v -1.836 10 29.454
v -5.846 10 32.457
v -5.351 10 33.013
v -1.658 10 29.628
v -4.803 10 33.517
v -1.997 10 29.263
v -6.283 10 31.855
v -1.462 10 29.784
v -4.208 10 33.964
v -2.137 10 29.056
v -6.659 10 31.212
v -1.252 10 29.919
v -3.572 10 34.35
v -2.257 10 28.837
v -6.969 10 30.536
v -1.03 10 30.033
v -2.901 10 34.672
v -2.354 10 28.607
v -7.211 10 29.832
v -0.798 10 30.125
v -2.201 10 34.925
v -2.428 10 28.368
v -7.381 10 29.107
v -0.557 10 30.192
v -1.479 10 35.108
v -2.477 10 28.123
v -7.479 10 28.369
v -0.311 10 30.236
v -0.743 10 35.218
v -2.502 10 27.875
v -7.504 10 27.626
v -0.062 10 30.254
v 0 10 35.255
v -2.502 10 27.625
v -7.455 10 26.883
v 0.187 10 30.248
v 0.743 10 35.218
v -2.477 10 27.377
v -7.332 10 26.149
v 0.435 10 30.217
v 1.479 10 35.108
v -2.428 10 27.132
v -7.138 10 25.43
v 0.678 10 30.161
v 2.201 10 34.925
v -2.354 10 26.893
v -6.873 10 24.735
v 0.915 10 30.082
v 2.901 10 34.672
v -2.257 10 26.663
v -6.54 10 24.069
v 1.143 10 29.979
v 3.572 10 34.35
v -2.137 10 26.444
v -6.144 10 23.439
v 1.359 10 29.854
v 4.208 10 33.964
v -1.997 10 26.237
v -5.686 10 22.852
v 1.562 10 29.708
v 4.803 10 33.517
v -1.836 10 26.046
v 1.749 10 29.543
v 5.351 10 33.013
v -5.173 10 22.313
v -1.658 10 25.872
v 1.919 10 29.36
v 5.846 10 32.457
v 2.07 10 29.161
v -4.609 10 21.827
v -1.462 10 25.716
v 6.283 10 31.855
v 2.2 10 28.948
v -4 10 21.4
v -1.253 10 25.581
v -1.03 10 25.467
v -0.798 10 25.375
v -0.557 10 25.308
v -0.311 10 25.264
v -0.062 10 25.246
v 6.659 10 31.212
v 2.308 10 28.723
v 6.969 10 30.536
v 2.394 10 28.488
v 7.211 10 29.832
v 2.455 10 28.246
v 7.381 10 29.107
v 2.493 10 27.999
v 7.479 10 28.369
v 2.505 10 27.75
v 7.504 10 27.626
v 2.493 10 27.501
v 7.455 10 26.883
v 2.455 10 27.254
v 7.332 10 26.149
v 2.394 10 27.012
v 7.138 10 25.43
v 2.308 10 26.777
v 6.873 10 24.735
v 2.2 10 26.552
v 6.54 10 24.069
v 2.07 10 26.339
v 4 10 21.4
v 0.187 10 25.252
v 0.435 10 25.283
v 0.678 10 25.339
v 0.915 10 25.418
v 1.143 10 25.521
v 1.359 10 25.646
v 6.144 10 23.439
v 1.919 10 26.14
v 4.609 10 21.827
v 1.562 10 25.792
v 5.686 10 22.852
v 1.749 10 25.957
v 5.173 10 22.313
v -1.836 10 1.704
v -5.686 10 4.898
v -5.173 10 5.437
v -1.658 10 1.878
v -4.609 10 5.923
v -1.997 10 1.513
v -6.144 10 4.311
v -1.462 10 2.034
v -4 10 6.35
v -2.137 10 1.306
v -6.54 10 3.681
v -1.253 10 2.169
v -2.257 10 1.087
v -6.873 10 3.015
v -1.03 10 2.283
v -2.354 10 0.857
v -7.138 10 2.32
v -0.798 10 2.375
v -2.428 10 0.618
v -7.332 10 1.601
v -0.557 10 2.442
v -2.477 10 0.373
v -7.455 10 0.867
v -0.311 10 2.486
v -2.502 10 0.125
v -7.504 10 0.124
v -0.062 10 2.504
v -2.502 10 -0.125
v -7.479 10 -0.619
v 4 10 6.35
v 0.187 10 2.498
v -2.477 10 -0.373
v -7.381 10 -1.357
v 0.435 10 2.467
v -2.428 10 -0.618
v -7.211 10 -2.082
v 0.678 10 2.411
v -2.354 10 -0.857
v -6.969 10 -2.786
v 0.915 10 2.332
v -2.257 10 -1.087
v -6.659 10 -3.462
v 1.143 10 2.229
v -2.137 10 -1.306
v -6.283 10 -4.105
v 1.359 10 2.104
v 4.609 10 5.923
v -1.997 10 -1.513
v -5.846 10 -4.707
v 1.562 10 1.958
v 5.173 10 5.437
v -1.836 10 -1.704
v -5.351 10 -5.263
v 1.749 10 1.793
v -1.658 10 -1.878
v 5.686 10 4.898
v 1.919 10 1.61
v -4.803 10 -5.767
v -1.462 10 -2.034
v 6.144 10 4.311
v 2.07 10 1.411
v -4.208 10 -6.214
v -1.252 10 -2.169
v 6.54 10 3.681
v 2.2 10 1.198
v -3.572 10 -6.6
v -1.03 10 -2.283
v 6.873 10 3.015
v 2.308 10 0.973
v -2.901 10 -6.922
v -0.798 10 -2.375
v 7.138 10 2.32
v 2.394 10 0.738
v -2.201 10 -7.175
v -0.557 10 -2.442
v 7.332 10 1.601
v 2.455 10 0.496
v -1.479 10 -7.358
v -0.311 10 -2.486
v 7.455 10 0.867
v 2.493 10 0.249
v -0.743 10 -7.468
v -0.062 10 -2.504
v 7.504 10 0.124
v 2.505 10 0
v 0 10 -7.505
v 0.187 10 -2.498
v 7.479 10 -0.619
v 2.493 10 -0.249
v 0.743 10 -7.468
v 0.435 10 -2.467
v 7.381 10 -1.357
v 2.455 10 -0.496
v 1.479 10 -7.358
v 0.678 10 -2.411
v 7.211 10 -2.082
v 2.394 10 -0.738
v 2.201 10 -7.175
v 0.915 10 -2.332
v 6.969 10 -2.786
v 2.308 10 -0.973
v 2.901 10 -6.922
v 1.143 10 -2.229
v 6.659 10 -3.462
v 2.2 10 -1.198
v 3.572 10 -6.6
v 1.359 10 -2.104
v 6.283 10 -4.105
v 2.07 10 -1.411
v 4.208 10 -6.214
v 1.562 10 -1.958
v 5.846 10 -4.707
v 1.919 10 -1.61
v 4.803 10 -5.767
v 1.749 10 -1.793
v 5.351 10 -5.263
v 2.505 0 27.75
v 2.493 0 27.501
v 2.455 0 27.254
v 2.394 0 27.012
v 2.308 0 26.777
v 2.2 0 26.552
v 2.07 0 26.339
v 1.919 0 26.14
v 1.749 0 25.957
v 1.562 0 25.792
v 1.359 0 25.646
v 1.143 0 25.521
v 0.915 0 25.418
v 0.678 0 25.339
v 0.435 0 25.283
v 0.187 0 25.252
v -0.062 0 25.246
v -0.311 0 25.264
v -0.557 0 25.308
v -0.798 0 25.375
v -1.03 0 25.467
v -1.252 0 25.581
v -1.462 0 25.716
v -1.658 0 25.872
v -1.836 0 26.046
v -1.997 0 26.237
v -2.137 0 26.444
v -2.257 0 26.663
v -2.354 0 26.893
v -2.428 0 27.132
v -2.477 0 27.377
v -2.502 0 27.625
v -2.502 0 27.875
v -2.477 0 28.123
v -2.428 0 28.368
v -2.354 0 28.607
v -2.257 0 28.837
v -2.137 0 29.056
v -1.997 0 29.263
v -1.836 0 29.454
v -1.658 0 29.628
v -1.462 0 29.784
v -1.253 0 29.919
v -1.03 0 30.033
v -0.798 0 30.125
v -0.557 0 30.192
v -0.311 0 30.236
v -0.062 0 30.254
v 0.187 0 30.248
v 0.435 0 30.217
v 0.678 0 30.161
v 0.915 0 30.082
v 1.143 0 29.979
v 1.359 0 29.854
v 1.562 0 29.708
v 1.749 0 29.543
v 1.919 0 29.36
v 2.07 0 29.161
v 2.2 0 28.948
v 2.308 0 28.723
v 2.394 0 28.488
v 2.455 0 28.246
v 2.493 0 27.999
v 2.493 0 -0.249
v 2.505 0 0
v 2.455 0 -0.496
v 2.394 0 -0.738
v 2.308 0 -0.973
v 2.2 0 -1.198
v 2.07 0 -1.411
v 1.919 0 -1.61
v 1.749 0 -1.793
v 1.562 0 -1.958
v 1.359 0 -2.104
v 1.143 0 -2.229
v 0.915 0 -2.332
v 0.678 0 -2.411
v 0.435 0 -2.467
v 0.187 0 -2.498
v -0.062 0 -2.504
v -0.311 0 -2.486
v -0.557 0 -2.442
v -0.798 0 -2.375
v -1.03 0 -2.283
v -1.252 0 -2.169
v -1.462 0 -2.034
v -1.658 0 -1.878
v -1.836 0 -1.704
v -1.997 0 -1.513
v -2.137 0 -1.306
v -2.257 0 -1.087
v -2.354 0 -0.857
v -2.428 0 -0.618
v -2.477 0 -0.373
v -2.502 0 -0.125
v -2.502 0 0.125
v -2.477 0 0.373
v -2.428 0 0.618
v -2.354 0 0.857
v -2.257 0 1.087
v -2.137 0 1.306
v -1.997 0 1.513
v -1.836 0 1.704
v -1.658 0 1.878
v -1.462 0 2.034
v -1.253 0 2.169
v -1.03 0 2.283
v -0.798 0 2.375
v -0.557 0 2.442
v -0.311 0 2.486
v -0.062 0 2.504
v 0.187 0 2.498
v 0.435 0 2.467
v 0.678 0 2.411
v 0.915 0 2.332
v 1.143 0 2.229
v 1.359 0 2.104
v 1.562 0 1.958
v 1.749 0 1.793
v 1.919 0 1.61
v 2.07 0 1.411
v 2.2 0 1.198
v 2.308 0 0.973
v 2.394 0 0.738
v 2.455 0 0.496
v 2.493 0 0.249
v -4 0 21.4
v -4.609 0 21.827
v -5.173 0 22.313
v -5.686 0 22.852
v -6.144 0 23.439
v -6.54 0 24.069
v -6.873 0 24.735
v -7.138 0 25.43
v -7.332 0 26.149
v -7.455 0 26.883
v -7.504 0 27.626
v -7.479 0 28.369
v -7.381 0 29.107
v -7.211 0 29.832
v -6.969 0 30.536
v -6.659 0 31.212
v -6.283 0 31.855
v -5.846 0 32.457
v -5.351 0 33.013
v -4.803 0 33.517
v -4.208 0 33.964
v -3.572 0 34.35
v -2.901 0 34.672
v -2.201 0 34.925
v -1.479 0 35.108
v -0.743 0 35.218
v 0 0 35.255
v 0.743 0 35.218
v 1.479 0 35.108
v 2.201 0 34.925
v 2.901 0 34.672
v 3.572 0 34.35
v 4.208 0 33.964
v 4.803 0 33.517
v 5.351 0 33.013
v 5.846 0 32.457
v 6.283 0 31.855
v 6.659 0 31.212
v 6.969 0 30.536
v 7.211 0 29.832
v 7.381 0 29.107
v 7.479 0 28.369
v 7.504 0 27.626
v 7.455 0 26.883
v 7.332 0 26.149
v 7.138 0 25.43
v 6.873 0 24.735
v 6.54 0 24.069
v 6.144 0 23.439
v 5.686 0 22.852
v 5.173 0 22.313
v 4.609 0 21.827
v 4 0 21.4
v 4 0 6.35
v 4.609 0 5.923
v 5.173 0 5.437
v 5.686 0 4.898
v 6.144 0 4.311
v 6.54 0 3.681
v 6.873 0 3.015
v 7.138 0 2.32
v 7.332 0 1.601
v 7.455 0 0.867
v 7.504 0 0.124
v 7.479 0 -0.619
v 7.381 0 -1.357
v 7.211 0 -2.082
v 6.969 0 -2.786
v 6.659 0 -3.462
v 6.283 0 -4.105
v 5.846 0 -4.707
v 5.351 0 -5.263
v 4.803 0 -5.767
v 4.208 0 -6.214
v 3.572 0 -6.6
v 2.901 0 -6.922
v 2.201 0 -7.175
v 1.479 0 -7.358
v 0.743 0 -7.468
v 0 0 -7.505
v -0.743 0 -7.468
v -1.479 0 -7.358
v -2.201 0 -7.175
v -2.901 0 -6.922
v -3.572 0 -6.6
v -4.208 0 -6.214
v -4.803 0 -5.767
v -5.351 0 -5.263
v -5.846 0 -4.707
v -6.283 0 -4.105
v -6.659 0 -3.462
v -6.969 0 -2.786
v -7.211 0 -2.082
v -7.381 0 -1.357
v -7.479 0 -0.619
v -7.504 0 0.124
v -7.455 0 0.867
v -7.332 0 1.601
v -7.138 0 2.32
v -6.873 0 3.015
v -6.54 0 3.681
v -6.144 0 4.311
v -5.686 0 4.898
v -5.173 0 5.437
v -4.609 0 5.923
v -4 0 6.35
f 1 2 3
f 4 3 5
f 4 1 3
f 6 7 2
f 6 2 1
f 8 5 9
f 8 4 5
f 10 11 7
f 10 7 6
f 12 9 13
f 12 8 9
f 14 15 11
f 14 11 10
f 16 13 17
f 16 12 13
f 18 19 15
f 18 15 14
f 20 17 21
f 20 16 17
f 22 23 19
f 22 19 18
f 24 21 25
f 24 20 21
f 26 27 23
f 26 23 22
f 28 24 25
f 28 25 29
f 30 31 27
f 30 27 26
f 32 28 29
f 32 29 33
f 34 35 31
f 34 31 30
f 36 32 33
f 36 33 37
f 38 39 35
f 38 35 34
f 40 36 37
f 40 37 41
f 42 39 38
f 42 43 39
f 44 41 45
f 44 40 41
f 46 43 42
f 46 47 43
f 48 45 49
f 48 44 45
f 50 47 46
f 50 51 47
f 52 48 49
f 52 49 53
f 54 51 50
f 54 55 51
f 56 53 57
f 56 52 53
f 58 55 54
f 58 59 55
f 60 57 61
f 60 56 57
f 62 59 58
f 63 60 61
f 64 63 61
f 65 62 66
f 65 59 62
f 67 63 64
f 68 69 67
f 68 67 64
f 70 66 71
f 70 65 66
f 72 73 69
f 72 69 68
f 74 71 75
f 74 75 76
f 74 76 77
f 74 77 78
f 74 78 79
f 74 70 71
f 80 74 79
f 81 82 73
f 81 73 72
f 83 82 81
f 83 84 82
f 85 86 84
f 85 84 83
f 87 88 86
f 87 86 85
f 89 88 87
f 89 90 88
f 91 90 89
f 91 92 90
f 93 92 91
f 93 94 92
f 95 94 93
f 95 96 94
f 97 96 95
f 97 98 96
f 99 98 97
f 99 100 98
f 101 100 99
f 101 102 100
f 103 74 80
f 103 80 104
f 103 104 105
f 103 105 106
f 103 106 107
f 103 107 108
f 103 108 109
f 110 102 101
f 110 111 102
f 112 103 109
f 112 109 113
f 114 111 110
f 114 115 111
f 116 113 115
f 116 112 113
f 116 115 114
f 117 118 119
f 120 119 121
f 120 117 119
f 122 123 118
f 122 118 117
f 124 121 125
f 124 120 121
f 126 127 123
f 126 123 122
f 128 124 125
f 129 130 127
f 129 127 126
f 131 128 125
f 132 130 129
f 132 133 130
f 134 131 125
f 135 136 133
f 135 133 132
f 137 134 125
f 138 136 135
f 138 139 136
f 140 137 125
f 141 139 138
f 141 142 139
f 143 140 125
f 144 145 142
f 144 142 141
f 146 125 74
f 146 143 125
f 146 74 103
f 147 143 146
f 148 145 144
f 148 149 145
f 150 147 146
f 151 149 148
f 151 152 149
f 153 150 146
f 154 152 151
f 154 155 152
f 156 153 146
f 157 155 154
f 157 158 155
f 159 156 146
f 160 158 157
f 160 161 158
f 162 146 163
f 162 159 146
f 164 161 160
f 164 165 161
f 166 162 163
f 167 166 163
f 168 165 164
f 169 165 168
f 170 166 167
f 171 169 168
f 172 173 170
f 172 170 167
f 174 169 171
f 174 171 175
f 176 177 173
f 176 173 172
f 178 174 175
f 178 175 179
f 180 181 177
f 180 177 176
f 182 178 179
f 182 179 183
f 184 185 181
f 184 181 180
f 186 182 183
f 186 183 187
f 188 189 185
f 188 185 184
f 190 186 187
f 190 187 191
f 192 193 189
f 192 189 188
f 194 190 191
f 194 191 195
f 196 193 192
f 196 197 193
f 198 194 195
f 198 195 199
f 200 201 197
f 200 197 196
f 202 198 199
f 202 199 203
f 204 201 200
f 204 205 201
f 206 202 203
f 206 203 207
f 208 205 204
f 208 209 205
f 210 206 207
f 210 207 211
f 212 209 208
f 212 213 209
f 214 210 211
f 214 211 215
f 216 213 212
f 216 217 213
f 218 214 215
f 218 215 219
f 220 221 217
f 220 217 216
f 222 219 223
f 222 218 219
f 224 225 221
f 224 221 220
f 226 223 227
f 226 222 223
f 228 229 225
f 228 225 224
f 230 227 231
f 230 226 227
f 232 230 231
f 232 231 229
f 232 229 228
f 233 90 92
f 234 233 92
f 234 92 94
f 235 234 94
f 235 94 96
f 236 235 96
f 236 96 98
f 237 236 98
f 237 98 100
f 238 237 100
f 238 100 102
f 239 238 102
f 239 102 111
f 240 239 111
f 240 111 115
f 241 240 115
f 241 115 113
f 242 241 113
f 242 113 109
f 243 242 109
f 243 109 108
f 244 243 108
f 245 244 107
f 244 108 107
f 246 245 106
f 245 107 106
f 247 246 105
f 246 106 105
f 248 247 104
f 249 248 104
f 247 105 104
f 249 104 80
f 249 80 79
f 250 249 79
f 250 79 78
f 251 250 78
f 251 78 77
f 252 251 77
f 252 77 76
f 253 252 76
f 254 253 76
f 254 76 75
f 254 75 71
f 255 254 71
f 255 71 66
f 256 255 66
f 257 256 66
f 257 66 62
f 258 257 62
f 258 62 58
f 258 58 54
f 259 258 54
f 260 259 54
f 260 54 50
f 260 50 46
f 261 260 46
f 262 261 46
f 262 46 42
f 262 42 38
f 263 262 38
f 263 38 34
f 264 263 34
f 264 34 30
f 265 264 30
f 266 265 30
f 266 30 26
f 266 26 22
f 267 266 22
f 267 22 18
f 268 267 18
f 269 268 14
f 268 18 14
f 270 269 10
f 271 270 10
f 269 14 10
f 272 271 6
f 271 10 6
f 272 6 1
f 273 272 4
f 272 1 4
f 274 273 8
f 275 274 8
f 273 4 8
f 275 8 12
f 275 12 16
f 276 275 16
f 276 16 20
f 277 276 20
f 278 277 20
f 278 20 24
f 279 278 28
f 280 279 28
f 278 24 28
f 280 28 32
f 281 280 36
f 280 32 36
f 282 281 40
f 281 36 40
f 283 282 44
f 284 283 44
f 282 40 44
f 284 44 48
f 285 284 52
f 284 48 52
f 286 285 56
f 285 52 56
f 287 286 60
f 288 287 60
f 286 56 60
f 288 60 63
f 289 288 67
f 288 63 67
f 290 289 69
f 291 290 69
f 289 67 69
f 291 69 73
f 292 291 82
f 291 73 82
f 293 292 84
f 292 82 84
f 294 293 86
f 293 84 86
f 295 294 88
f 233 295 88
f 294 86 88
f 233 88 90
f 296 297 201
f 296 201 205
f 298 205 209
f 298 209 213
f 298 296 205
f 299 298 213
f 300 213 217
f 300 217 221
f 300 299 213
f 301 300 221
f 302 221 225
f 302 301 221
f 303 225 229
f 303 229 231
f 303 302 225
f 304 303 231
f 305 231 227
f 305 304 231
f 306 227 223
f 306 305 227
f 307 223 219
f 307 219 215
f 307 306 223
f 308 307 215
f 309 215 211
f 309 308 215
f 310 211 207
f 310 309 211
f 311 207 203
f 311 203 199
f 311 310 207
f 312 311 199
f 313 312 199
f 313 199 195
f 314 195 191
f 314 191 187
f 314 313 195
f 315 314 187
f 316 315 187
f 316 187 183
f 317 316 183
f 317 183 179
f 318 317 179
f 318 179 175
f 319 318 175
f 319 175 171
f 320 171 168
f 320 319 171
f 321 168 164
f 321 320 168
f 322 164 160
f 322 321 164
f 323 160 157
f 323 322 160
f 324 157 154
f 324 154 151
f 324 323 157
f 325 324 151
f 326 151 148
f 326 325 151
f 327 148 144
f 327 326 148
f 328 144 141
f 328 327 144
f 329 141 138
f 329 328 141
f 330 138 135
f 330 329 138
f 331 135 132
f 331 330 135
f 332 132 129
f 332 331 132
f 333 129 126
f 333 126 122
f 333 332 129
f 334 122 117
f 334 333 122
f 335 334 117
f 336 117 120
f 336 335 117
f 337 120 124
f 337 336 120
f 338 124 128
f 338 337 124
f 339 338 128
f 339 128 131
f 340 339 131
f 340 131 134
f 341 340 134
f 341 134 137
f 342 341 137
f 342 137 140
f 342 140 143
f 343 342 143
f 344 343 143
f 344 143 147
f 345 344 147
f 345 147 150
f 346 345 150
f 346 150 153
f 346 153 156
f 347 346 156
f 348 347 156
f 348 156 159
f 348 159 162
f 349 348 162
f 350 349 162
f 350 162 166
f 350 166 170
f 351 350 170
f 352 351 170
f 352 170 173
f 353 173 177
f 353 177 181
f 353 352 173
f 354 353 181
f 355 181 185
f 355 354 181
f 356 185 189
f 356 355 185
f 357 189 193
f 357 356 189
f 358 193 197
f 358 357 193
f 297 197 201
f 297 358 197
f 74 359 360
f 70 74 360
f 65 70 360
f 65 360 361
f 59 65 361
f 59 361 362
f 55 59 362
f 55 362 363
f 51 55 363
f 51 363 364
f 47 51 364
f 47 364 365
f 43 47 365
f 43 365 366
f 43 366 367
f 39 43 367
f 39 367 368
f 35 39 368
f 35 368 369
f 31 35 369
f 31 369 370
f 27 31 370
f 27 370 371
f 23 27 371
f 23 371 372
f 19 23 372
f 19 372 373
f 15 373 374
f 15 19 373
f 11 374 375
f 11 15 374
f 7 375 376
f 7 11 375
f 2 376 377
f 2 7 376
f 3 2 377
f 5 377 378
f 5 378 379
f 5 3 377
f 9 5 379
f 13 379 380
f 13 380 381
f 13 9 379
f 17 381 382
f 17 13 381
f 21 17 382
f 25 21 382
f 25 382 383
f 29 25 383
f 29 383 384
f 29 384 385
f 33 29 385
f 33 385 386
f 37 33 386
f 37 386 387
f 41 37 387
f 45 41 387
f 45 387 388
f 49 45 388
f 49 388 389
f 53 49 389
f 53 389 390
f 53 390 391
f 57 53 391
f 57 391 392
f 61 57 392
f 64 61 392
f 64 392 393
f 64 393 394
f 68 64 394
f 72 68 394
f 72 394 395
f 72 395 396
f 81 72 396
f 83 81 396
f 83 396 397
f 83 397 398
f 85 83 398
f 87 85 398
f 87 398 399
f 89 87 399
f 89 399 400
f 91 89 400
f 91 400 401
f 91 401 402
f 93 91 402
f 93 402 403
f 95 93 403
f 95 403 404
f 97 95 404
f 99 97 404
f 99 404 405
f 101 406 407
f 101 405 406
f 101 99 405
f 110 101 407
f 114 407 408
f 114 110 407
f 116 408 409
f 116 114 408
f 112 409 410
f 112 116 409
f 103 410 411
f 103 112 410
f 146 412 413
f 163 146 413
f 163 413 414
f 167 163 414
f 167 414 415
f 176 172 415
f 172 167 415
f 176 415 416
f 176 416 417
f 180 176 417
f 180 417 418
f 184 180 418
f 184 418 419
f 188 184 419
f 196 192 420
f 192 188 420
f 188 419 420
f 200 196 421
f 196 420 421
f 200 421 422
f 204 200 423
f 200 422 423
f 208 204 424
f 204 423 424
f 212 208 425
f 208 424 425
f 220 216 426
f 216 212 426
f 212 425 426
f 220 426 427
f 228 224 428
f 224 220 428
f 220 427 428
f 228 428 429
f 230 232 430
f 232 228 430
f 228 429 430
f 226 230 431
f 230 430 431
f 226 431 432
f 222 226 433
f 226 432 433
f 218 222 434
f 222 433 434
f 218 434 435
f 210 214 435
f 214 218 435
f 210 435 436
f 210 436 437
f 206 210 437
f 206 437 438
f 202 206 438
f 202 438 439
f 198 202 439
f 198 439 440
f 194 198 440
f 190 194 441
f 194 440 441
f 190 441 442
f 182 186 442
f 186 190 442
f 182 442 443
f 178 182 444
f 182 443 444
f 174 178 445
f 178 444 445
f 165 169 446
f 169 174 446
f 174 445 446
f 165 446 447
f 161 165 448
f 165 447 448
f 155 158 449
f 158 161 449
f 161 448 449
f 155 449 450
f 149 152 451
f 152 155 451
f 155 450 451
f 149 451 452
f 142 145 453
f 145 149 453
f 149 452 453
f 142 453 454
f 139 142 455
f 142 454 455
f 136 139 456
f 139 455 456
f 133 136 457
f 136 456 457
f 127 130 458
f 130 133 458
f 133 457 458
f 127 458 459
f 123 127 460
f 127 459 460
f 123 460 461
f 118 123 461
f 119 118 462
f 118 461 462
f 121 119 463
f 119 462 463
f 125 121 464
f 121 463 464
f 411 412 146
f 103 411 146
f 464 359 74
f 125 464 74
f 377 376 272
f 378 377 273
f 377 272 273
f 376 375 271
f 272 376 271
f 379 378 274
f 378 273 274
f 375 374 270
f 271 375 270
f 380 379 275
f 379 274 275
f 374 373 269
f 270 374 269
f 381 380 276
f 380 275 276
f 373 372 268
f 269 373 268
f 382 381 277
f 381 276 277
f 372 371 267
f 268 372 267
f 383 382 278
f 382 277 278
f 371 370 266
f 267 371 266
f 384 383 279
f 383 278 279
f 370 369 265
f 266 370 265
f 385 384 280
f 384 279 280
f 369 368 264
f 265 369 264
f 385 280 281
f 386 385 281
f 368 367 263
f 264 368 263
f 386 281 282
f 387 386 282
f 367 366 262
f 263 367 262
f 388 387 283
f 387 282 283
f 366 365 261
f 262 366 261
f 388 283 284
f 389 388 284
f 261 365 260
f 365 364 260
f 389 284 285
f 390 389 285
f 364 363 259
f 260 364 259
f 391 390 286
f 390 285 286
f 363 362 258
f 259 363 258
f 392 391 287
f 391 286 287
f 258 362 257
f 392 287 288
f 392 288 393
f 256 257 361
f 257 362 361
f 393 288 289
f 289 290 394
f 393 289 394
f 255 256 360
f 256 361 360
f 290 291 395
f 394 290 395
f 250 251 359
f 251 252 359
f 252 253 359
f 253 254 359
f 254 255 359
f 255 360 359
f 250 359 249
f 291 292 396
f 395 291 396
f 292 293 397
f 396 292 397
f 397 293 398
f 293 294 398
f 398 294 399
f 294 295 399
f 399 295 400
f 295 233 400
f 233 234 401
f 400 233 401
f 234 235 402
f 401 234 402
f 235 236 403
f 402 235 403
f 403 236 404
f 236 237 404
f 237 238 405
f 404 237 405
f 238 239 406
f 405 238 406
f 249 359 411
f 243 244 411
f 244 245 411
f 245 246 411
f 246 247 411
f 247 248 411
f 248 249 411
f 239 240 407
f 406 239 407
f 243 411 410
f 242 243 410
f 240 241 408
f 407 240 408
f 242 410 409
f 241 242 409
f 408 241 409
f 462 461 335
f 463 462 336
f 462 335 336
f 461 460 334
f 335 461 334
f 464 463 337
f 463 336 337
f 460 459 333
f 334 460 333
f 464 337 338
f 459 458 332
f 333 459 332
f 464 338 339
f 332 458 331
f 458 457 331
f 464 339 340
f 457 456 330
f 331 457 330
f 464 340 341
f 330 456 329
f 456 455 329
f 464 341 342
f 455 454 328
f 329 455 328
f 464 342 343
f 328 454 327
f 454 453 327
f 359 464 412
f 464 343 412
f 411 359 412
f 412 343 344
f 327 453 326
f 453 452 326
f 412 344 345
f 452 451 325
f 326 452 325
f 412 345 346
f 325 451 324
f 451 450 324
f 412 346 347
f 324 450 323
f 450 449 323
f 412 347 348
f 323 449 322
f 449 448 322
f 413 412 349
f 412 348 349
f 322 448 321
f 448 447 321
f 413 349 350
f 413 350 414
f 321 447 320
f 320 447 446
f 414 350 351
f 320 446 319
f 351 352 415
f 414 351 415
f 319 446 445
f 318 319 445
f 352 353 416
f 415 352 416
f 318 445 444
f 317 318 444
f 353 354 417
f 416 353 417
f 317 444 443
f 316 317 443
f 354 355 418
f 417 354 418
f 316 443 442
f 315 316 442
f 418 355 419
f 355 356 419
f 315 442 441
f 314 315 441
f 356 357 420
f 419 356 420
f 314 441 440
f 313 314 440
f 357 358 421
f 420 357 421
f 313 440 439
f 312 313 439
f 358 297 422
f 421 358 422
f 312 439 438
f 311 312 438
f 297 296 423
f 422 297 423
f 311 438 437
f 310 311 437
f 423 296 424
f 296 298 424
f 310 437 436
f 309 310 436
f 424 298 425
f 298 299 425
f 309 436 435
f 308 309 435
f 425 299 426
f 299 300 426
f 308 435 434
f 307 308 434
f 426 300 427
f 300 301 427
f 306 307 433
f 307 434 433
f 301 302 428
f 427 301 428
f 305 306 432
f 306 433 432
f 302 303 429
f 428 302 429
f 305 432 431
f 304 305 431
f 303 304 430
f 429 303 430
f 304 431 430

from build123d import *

# Parameters (mm, degrees)
SKETCH_1_R           = 7.505
SKETCH_1_R_2         = 2.505
EXTRUDE_1_DEPTH      = 10
EXTRUDE_3_DEPTH      = 18.25
EXTRUDE_3_DEPTH_BACK = 7
SKETCH_7_W           = 8
SKETCH_7_H           = 10
SKETCH_9_W           = 8
SKETCH_9_H           = 3.5
CUT_EXTRUDE_1_DEPTH  = 18.25
SKETCH_10_R          = 7.505
SKETCH_10_R_2        = 2.505
EXTRUDE_4_DEPTH      = 10
SKETCH_11_R          = 2.505
CUT_EXTRUDE_2_DEPTH  = 10


with BuildPart() as part:
    # 草圖1 → 伸長-薄件1 (new body)
    with BuildSketch(Plane(origin=(0, 0, 0), x_dir=(1, 0, 0), z_dir=(0, 1, 0))):
        Circle(SKETCH_1_R)
        Circle(SKETCH_1_R_2, mode=Mode.SUBTRACT)
    extrude(amount=EXTRUDE_1_DEPTH)

    # 草圖7 → 填料-伸長3 (add, two sides: drawn at the far end of the back side and taken through both)
    with BuildSketch(Plane.XY.offset(13).offset(-EXTRUDE_3_DEPTH_BACK)):
        with Locations((0, 5)):
            Rectangle(SKETCH_7_W, SKETCH_7_H)
    extrude(amount=EXTRUDE_3_DEPTH + EXTRUDE_3_DEPTH_BACK)

    # 草圖9 → 除料-伸長1 (cut)
    with BuildSketch(Plane(origin=(0, 10, 0), x_dir=(1, 0, 0), z_dir=(0, 1, 0))):
        with Locations((0, -29.5)):
            Rectangle(SKETCH_9_W, SKETCH_9_H)
    extrude(amount=-CUT_EXTRUDE_1_DEPTH, mode=Mode.SUBTRACT)

    # 草圖10 → 伸長-薄件4 (add)
    with BuildSketch(Plane(origin=(0, 10, 0), x_dir=(1, 0, 0), z_dir=(0, 1, 0))):
        with Locations((0, -27.75)):
            Circle(SKETCH_10_R)
        with Locations((0, -27.75)):
            Circle(SKETCH_10_R_2, mode=Mode.SUBTRACT)
    extrude(amount=-EXTRUDE_4_DEPTH)

    # 草圖11 → 除料-伸長2 (cut)
    with BuildSketch(Plane(origin=(0, 10, 0), x_dir=(1, 0, 0), z_dir=(0, 1, 0))):
        with Locations(Location((0, -27.75, 0), (0, 0, 270))):
            Circle(SKETCH_11_R)
    extrude(amount=-CUT_EXTRUDE_2_DEPTH, mode=Mode.SUBTRACT)


solid = part.part
